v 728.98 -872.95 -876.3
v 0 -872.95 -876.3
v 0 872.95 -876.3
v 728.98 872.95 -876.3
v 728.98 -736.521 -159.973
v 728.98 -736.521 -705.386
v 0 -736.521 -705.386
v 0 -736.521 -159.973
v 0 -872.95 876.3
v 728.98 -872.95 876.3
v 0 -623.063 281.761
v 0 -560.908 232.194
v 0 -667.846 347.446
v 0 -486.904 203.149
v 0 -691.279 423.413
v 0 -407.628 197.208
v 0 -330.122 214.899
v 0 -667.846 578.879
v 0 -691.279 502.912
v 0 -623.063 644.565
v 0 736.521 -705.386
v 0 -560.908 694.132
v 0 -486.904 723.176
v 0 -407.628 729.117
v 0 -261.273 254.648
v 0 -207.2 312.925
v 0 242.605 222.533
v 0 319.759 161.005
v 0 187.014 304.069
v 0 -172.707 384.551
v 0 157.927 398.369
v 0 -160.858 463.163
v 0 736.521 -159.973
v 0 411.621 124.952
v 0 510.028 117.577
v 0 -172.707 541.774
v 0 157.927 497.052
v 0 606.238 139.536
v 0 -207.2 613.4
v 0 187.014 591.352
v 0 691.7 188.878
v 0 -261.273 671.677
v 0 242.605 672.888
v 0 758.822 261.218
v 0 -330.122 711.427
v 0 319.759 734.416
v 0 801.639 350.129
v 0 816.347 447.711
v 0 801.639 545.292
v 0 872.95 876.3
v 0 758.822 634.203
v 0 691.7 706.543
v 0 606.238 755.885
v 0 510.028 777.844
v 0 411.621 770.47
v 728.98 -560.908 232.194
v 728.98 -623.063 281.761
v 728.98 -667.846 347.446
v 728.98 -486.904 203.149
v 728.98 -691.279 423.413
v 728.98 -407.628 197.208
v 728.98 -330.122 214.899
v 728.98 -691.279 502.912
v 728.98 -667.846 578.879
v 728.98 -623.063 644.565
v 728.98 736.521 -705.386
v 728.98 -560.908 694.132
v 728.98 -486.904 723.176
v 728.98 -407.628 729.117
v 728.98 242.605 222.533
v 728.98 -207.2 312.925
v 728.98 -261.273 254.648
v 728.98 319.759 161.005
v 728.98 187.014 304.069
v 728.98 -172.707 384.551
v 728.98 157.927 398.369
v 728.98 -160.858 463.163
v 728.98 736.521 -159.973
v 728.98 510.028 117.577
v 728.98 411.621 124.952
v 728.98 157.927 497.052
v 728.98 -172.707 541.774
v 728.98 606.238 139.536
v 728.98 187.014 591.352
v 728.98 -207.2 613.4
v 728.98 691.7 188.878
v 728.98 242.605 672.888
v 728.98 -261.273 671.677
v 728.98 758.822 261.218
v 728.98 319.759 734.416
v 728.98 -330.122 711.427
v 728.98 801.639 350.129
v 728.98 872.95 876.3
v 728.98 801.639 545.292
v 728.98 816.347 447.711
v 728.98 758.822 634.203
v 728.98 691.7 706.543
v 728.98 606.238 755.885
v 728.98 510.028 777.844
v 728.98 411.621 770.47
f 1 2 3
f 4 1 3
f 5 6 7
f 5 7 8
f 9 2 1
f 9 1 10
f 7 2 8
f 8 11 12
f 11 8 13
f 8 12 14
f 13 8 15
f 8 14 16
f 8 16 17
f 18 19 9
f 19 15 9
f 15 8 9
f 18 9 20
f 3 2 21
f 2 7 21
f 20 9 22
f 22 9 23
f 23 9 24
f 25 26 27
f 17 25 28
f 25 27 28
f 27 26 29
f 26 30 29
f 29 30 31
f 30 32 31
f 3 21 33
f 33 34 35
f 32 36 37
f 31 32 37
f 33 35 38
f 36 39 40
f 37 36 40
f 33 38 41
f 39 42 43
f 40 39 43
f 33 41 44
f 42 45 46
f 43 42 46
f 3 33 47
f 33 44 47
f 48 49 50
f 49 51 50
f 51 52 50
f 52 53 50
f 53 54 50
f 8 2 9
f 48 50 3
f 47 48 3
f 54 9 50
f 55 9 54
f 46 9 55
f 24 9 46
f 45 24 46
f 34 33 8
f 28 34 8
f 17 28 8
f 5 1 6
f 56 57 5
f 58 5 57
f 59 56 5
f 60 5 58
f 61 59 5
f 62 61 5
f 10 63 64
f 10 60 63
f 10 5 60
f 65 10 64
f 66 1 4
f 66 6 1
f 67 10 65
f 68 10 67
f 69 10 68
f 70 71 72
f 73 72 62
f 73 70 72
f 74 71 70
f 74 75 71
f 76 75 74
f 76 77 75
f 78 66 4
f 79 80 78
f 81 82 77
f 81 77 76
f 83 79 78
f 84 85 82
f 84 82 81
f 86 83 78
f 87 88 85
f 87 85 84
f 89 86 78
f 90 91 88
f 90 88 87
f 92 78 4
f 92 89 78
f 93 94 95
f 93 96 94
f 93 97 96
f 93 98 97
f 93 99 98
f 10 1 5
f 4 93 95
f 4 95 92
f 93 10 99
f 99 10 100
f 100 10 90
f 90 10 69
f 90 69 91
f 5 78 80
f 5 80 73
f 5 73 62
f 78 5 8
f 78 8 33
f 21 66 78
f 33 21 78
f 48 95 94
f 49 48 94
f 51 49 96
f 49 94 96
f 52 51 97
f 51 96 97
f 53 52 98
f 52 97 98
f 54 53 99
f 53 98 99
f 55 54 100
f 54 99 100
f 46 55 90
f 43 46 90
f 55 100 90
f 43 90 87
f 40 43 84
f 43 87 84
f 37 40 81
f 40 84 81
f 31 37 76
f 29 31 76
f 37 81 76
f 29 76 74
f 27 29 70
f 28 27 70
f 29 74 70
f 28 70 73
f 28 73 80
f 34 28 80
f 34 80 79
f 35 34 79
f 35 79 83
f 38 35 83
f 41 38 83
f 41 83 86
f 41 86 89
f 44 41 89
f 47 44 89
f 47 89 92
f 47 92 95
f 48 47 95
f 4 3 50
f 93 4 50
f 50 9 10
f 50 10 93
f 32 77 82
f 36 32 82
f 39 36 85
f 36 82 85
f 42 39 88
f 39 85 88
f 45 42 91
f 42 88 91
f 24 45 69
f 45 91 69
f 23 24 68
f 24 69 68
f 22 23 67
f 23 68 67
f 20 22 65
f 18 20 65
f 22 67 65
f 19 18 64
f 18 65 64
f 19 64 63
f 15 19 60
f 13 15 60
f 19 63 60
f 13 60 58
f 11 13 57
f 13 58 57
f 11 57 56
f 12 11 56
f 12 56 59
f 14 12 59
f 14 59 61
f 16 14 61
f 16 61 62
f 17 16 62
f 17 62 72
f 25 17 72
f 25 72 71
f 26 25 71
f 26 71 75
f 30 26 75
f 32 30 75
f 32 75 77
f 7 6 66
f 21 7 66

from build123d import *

# Parameters (mm, degrees)
F0_W     = 1745.899328
F0_H     = 1752.6
F1_DEPTH = 728.98
F2_R     = 266.7
F3_DEPTH = 949.96
F4_W     = 1473.042846
F4_H     = 545.412392
F4_R     = 331.059319
F5_DEPTH = 1889.76


with BuildPart() as f1:
    # F0 (on Right) → F1 (new body)
    with BuildSketch(Plane.YZ):
        Rectangle(F0_W, F0_H)
    extrude(amount=F1_DEPTH)

    # F2 (on face) → F3 (cut)
    with BuildSketch(Plane.YZ.offset(728.98)):
        with Locations((-427.558064, 463.162661)):
            Circle(F2_R)
    extrude(amount=-F3_DEPTH, mode=Mode.SUBTRACT)

    # F4 (on face) → F5 (cut)
    with BuildSketch(Plane.YZ.offset(728.98)):
        with Locations((0, -432.679504)):
            Rectangle(F4_W, F4_H)
        with Locations((485.288173, 447.710544)):
            Circle(F4_R)
    extrude(amount=-F5_DEPTH, mode=Mode.SUBTRACT)


solid = f1.part
